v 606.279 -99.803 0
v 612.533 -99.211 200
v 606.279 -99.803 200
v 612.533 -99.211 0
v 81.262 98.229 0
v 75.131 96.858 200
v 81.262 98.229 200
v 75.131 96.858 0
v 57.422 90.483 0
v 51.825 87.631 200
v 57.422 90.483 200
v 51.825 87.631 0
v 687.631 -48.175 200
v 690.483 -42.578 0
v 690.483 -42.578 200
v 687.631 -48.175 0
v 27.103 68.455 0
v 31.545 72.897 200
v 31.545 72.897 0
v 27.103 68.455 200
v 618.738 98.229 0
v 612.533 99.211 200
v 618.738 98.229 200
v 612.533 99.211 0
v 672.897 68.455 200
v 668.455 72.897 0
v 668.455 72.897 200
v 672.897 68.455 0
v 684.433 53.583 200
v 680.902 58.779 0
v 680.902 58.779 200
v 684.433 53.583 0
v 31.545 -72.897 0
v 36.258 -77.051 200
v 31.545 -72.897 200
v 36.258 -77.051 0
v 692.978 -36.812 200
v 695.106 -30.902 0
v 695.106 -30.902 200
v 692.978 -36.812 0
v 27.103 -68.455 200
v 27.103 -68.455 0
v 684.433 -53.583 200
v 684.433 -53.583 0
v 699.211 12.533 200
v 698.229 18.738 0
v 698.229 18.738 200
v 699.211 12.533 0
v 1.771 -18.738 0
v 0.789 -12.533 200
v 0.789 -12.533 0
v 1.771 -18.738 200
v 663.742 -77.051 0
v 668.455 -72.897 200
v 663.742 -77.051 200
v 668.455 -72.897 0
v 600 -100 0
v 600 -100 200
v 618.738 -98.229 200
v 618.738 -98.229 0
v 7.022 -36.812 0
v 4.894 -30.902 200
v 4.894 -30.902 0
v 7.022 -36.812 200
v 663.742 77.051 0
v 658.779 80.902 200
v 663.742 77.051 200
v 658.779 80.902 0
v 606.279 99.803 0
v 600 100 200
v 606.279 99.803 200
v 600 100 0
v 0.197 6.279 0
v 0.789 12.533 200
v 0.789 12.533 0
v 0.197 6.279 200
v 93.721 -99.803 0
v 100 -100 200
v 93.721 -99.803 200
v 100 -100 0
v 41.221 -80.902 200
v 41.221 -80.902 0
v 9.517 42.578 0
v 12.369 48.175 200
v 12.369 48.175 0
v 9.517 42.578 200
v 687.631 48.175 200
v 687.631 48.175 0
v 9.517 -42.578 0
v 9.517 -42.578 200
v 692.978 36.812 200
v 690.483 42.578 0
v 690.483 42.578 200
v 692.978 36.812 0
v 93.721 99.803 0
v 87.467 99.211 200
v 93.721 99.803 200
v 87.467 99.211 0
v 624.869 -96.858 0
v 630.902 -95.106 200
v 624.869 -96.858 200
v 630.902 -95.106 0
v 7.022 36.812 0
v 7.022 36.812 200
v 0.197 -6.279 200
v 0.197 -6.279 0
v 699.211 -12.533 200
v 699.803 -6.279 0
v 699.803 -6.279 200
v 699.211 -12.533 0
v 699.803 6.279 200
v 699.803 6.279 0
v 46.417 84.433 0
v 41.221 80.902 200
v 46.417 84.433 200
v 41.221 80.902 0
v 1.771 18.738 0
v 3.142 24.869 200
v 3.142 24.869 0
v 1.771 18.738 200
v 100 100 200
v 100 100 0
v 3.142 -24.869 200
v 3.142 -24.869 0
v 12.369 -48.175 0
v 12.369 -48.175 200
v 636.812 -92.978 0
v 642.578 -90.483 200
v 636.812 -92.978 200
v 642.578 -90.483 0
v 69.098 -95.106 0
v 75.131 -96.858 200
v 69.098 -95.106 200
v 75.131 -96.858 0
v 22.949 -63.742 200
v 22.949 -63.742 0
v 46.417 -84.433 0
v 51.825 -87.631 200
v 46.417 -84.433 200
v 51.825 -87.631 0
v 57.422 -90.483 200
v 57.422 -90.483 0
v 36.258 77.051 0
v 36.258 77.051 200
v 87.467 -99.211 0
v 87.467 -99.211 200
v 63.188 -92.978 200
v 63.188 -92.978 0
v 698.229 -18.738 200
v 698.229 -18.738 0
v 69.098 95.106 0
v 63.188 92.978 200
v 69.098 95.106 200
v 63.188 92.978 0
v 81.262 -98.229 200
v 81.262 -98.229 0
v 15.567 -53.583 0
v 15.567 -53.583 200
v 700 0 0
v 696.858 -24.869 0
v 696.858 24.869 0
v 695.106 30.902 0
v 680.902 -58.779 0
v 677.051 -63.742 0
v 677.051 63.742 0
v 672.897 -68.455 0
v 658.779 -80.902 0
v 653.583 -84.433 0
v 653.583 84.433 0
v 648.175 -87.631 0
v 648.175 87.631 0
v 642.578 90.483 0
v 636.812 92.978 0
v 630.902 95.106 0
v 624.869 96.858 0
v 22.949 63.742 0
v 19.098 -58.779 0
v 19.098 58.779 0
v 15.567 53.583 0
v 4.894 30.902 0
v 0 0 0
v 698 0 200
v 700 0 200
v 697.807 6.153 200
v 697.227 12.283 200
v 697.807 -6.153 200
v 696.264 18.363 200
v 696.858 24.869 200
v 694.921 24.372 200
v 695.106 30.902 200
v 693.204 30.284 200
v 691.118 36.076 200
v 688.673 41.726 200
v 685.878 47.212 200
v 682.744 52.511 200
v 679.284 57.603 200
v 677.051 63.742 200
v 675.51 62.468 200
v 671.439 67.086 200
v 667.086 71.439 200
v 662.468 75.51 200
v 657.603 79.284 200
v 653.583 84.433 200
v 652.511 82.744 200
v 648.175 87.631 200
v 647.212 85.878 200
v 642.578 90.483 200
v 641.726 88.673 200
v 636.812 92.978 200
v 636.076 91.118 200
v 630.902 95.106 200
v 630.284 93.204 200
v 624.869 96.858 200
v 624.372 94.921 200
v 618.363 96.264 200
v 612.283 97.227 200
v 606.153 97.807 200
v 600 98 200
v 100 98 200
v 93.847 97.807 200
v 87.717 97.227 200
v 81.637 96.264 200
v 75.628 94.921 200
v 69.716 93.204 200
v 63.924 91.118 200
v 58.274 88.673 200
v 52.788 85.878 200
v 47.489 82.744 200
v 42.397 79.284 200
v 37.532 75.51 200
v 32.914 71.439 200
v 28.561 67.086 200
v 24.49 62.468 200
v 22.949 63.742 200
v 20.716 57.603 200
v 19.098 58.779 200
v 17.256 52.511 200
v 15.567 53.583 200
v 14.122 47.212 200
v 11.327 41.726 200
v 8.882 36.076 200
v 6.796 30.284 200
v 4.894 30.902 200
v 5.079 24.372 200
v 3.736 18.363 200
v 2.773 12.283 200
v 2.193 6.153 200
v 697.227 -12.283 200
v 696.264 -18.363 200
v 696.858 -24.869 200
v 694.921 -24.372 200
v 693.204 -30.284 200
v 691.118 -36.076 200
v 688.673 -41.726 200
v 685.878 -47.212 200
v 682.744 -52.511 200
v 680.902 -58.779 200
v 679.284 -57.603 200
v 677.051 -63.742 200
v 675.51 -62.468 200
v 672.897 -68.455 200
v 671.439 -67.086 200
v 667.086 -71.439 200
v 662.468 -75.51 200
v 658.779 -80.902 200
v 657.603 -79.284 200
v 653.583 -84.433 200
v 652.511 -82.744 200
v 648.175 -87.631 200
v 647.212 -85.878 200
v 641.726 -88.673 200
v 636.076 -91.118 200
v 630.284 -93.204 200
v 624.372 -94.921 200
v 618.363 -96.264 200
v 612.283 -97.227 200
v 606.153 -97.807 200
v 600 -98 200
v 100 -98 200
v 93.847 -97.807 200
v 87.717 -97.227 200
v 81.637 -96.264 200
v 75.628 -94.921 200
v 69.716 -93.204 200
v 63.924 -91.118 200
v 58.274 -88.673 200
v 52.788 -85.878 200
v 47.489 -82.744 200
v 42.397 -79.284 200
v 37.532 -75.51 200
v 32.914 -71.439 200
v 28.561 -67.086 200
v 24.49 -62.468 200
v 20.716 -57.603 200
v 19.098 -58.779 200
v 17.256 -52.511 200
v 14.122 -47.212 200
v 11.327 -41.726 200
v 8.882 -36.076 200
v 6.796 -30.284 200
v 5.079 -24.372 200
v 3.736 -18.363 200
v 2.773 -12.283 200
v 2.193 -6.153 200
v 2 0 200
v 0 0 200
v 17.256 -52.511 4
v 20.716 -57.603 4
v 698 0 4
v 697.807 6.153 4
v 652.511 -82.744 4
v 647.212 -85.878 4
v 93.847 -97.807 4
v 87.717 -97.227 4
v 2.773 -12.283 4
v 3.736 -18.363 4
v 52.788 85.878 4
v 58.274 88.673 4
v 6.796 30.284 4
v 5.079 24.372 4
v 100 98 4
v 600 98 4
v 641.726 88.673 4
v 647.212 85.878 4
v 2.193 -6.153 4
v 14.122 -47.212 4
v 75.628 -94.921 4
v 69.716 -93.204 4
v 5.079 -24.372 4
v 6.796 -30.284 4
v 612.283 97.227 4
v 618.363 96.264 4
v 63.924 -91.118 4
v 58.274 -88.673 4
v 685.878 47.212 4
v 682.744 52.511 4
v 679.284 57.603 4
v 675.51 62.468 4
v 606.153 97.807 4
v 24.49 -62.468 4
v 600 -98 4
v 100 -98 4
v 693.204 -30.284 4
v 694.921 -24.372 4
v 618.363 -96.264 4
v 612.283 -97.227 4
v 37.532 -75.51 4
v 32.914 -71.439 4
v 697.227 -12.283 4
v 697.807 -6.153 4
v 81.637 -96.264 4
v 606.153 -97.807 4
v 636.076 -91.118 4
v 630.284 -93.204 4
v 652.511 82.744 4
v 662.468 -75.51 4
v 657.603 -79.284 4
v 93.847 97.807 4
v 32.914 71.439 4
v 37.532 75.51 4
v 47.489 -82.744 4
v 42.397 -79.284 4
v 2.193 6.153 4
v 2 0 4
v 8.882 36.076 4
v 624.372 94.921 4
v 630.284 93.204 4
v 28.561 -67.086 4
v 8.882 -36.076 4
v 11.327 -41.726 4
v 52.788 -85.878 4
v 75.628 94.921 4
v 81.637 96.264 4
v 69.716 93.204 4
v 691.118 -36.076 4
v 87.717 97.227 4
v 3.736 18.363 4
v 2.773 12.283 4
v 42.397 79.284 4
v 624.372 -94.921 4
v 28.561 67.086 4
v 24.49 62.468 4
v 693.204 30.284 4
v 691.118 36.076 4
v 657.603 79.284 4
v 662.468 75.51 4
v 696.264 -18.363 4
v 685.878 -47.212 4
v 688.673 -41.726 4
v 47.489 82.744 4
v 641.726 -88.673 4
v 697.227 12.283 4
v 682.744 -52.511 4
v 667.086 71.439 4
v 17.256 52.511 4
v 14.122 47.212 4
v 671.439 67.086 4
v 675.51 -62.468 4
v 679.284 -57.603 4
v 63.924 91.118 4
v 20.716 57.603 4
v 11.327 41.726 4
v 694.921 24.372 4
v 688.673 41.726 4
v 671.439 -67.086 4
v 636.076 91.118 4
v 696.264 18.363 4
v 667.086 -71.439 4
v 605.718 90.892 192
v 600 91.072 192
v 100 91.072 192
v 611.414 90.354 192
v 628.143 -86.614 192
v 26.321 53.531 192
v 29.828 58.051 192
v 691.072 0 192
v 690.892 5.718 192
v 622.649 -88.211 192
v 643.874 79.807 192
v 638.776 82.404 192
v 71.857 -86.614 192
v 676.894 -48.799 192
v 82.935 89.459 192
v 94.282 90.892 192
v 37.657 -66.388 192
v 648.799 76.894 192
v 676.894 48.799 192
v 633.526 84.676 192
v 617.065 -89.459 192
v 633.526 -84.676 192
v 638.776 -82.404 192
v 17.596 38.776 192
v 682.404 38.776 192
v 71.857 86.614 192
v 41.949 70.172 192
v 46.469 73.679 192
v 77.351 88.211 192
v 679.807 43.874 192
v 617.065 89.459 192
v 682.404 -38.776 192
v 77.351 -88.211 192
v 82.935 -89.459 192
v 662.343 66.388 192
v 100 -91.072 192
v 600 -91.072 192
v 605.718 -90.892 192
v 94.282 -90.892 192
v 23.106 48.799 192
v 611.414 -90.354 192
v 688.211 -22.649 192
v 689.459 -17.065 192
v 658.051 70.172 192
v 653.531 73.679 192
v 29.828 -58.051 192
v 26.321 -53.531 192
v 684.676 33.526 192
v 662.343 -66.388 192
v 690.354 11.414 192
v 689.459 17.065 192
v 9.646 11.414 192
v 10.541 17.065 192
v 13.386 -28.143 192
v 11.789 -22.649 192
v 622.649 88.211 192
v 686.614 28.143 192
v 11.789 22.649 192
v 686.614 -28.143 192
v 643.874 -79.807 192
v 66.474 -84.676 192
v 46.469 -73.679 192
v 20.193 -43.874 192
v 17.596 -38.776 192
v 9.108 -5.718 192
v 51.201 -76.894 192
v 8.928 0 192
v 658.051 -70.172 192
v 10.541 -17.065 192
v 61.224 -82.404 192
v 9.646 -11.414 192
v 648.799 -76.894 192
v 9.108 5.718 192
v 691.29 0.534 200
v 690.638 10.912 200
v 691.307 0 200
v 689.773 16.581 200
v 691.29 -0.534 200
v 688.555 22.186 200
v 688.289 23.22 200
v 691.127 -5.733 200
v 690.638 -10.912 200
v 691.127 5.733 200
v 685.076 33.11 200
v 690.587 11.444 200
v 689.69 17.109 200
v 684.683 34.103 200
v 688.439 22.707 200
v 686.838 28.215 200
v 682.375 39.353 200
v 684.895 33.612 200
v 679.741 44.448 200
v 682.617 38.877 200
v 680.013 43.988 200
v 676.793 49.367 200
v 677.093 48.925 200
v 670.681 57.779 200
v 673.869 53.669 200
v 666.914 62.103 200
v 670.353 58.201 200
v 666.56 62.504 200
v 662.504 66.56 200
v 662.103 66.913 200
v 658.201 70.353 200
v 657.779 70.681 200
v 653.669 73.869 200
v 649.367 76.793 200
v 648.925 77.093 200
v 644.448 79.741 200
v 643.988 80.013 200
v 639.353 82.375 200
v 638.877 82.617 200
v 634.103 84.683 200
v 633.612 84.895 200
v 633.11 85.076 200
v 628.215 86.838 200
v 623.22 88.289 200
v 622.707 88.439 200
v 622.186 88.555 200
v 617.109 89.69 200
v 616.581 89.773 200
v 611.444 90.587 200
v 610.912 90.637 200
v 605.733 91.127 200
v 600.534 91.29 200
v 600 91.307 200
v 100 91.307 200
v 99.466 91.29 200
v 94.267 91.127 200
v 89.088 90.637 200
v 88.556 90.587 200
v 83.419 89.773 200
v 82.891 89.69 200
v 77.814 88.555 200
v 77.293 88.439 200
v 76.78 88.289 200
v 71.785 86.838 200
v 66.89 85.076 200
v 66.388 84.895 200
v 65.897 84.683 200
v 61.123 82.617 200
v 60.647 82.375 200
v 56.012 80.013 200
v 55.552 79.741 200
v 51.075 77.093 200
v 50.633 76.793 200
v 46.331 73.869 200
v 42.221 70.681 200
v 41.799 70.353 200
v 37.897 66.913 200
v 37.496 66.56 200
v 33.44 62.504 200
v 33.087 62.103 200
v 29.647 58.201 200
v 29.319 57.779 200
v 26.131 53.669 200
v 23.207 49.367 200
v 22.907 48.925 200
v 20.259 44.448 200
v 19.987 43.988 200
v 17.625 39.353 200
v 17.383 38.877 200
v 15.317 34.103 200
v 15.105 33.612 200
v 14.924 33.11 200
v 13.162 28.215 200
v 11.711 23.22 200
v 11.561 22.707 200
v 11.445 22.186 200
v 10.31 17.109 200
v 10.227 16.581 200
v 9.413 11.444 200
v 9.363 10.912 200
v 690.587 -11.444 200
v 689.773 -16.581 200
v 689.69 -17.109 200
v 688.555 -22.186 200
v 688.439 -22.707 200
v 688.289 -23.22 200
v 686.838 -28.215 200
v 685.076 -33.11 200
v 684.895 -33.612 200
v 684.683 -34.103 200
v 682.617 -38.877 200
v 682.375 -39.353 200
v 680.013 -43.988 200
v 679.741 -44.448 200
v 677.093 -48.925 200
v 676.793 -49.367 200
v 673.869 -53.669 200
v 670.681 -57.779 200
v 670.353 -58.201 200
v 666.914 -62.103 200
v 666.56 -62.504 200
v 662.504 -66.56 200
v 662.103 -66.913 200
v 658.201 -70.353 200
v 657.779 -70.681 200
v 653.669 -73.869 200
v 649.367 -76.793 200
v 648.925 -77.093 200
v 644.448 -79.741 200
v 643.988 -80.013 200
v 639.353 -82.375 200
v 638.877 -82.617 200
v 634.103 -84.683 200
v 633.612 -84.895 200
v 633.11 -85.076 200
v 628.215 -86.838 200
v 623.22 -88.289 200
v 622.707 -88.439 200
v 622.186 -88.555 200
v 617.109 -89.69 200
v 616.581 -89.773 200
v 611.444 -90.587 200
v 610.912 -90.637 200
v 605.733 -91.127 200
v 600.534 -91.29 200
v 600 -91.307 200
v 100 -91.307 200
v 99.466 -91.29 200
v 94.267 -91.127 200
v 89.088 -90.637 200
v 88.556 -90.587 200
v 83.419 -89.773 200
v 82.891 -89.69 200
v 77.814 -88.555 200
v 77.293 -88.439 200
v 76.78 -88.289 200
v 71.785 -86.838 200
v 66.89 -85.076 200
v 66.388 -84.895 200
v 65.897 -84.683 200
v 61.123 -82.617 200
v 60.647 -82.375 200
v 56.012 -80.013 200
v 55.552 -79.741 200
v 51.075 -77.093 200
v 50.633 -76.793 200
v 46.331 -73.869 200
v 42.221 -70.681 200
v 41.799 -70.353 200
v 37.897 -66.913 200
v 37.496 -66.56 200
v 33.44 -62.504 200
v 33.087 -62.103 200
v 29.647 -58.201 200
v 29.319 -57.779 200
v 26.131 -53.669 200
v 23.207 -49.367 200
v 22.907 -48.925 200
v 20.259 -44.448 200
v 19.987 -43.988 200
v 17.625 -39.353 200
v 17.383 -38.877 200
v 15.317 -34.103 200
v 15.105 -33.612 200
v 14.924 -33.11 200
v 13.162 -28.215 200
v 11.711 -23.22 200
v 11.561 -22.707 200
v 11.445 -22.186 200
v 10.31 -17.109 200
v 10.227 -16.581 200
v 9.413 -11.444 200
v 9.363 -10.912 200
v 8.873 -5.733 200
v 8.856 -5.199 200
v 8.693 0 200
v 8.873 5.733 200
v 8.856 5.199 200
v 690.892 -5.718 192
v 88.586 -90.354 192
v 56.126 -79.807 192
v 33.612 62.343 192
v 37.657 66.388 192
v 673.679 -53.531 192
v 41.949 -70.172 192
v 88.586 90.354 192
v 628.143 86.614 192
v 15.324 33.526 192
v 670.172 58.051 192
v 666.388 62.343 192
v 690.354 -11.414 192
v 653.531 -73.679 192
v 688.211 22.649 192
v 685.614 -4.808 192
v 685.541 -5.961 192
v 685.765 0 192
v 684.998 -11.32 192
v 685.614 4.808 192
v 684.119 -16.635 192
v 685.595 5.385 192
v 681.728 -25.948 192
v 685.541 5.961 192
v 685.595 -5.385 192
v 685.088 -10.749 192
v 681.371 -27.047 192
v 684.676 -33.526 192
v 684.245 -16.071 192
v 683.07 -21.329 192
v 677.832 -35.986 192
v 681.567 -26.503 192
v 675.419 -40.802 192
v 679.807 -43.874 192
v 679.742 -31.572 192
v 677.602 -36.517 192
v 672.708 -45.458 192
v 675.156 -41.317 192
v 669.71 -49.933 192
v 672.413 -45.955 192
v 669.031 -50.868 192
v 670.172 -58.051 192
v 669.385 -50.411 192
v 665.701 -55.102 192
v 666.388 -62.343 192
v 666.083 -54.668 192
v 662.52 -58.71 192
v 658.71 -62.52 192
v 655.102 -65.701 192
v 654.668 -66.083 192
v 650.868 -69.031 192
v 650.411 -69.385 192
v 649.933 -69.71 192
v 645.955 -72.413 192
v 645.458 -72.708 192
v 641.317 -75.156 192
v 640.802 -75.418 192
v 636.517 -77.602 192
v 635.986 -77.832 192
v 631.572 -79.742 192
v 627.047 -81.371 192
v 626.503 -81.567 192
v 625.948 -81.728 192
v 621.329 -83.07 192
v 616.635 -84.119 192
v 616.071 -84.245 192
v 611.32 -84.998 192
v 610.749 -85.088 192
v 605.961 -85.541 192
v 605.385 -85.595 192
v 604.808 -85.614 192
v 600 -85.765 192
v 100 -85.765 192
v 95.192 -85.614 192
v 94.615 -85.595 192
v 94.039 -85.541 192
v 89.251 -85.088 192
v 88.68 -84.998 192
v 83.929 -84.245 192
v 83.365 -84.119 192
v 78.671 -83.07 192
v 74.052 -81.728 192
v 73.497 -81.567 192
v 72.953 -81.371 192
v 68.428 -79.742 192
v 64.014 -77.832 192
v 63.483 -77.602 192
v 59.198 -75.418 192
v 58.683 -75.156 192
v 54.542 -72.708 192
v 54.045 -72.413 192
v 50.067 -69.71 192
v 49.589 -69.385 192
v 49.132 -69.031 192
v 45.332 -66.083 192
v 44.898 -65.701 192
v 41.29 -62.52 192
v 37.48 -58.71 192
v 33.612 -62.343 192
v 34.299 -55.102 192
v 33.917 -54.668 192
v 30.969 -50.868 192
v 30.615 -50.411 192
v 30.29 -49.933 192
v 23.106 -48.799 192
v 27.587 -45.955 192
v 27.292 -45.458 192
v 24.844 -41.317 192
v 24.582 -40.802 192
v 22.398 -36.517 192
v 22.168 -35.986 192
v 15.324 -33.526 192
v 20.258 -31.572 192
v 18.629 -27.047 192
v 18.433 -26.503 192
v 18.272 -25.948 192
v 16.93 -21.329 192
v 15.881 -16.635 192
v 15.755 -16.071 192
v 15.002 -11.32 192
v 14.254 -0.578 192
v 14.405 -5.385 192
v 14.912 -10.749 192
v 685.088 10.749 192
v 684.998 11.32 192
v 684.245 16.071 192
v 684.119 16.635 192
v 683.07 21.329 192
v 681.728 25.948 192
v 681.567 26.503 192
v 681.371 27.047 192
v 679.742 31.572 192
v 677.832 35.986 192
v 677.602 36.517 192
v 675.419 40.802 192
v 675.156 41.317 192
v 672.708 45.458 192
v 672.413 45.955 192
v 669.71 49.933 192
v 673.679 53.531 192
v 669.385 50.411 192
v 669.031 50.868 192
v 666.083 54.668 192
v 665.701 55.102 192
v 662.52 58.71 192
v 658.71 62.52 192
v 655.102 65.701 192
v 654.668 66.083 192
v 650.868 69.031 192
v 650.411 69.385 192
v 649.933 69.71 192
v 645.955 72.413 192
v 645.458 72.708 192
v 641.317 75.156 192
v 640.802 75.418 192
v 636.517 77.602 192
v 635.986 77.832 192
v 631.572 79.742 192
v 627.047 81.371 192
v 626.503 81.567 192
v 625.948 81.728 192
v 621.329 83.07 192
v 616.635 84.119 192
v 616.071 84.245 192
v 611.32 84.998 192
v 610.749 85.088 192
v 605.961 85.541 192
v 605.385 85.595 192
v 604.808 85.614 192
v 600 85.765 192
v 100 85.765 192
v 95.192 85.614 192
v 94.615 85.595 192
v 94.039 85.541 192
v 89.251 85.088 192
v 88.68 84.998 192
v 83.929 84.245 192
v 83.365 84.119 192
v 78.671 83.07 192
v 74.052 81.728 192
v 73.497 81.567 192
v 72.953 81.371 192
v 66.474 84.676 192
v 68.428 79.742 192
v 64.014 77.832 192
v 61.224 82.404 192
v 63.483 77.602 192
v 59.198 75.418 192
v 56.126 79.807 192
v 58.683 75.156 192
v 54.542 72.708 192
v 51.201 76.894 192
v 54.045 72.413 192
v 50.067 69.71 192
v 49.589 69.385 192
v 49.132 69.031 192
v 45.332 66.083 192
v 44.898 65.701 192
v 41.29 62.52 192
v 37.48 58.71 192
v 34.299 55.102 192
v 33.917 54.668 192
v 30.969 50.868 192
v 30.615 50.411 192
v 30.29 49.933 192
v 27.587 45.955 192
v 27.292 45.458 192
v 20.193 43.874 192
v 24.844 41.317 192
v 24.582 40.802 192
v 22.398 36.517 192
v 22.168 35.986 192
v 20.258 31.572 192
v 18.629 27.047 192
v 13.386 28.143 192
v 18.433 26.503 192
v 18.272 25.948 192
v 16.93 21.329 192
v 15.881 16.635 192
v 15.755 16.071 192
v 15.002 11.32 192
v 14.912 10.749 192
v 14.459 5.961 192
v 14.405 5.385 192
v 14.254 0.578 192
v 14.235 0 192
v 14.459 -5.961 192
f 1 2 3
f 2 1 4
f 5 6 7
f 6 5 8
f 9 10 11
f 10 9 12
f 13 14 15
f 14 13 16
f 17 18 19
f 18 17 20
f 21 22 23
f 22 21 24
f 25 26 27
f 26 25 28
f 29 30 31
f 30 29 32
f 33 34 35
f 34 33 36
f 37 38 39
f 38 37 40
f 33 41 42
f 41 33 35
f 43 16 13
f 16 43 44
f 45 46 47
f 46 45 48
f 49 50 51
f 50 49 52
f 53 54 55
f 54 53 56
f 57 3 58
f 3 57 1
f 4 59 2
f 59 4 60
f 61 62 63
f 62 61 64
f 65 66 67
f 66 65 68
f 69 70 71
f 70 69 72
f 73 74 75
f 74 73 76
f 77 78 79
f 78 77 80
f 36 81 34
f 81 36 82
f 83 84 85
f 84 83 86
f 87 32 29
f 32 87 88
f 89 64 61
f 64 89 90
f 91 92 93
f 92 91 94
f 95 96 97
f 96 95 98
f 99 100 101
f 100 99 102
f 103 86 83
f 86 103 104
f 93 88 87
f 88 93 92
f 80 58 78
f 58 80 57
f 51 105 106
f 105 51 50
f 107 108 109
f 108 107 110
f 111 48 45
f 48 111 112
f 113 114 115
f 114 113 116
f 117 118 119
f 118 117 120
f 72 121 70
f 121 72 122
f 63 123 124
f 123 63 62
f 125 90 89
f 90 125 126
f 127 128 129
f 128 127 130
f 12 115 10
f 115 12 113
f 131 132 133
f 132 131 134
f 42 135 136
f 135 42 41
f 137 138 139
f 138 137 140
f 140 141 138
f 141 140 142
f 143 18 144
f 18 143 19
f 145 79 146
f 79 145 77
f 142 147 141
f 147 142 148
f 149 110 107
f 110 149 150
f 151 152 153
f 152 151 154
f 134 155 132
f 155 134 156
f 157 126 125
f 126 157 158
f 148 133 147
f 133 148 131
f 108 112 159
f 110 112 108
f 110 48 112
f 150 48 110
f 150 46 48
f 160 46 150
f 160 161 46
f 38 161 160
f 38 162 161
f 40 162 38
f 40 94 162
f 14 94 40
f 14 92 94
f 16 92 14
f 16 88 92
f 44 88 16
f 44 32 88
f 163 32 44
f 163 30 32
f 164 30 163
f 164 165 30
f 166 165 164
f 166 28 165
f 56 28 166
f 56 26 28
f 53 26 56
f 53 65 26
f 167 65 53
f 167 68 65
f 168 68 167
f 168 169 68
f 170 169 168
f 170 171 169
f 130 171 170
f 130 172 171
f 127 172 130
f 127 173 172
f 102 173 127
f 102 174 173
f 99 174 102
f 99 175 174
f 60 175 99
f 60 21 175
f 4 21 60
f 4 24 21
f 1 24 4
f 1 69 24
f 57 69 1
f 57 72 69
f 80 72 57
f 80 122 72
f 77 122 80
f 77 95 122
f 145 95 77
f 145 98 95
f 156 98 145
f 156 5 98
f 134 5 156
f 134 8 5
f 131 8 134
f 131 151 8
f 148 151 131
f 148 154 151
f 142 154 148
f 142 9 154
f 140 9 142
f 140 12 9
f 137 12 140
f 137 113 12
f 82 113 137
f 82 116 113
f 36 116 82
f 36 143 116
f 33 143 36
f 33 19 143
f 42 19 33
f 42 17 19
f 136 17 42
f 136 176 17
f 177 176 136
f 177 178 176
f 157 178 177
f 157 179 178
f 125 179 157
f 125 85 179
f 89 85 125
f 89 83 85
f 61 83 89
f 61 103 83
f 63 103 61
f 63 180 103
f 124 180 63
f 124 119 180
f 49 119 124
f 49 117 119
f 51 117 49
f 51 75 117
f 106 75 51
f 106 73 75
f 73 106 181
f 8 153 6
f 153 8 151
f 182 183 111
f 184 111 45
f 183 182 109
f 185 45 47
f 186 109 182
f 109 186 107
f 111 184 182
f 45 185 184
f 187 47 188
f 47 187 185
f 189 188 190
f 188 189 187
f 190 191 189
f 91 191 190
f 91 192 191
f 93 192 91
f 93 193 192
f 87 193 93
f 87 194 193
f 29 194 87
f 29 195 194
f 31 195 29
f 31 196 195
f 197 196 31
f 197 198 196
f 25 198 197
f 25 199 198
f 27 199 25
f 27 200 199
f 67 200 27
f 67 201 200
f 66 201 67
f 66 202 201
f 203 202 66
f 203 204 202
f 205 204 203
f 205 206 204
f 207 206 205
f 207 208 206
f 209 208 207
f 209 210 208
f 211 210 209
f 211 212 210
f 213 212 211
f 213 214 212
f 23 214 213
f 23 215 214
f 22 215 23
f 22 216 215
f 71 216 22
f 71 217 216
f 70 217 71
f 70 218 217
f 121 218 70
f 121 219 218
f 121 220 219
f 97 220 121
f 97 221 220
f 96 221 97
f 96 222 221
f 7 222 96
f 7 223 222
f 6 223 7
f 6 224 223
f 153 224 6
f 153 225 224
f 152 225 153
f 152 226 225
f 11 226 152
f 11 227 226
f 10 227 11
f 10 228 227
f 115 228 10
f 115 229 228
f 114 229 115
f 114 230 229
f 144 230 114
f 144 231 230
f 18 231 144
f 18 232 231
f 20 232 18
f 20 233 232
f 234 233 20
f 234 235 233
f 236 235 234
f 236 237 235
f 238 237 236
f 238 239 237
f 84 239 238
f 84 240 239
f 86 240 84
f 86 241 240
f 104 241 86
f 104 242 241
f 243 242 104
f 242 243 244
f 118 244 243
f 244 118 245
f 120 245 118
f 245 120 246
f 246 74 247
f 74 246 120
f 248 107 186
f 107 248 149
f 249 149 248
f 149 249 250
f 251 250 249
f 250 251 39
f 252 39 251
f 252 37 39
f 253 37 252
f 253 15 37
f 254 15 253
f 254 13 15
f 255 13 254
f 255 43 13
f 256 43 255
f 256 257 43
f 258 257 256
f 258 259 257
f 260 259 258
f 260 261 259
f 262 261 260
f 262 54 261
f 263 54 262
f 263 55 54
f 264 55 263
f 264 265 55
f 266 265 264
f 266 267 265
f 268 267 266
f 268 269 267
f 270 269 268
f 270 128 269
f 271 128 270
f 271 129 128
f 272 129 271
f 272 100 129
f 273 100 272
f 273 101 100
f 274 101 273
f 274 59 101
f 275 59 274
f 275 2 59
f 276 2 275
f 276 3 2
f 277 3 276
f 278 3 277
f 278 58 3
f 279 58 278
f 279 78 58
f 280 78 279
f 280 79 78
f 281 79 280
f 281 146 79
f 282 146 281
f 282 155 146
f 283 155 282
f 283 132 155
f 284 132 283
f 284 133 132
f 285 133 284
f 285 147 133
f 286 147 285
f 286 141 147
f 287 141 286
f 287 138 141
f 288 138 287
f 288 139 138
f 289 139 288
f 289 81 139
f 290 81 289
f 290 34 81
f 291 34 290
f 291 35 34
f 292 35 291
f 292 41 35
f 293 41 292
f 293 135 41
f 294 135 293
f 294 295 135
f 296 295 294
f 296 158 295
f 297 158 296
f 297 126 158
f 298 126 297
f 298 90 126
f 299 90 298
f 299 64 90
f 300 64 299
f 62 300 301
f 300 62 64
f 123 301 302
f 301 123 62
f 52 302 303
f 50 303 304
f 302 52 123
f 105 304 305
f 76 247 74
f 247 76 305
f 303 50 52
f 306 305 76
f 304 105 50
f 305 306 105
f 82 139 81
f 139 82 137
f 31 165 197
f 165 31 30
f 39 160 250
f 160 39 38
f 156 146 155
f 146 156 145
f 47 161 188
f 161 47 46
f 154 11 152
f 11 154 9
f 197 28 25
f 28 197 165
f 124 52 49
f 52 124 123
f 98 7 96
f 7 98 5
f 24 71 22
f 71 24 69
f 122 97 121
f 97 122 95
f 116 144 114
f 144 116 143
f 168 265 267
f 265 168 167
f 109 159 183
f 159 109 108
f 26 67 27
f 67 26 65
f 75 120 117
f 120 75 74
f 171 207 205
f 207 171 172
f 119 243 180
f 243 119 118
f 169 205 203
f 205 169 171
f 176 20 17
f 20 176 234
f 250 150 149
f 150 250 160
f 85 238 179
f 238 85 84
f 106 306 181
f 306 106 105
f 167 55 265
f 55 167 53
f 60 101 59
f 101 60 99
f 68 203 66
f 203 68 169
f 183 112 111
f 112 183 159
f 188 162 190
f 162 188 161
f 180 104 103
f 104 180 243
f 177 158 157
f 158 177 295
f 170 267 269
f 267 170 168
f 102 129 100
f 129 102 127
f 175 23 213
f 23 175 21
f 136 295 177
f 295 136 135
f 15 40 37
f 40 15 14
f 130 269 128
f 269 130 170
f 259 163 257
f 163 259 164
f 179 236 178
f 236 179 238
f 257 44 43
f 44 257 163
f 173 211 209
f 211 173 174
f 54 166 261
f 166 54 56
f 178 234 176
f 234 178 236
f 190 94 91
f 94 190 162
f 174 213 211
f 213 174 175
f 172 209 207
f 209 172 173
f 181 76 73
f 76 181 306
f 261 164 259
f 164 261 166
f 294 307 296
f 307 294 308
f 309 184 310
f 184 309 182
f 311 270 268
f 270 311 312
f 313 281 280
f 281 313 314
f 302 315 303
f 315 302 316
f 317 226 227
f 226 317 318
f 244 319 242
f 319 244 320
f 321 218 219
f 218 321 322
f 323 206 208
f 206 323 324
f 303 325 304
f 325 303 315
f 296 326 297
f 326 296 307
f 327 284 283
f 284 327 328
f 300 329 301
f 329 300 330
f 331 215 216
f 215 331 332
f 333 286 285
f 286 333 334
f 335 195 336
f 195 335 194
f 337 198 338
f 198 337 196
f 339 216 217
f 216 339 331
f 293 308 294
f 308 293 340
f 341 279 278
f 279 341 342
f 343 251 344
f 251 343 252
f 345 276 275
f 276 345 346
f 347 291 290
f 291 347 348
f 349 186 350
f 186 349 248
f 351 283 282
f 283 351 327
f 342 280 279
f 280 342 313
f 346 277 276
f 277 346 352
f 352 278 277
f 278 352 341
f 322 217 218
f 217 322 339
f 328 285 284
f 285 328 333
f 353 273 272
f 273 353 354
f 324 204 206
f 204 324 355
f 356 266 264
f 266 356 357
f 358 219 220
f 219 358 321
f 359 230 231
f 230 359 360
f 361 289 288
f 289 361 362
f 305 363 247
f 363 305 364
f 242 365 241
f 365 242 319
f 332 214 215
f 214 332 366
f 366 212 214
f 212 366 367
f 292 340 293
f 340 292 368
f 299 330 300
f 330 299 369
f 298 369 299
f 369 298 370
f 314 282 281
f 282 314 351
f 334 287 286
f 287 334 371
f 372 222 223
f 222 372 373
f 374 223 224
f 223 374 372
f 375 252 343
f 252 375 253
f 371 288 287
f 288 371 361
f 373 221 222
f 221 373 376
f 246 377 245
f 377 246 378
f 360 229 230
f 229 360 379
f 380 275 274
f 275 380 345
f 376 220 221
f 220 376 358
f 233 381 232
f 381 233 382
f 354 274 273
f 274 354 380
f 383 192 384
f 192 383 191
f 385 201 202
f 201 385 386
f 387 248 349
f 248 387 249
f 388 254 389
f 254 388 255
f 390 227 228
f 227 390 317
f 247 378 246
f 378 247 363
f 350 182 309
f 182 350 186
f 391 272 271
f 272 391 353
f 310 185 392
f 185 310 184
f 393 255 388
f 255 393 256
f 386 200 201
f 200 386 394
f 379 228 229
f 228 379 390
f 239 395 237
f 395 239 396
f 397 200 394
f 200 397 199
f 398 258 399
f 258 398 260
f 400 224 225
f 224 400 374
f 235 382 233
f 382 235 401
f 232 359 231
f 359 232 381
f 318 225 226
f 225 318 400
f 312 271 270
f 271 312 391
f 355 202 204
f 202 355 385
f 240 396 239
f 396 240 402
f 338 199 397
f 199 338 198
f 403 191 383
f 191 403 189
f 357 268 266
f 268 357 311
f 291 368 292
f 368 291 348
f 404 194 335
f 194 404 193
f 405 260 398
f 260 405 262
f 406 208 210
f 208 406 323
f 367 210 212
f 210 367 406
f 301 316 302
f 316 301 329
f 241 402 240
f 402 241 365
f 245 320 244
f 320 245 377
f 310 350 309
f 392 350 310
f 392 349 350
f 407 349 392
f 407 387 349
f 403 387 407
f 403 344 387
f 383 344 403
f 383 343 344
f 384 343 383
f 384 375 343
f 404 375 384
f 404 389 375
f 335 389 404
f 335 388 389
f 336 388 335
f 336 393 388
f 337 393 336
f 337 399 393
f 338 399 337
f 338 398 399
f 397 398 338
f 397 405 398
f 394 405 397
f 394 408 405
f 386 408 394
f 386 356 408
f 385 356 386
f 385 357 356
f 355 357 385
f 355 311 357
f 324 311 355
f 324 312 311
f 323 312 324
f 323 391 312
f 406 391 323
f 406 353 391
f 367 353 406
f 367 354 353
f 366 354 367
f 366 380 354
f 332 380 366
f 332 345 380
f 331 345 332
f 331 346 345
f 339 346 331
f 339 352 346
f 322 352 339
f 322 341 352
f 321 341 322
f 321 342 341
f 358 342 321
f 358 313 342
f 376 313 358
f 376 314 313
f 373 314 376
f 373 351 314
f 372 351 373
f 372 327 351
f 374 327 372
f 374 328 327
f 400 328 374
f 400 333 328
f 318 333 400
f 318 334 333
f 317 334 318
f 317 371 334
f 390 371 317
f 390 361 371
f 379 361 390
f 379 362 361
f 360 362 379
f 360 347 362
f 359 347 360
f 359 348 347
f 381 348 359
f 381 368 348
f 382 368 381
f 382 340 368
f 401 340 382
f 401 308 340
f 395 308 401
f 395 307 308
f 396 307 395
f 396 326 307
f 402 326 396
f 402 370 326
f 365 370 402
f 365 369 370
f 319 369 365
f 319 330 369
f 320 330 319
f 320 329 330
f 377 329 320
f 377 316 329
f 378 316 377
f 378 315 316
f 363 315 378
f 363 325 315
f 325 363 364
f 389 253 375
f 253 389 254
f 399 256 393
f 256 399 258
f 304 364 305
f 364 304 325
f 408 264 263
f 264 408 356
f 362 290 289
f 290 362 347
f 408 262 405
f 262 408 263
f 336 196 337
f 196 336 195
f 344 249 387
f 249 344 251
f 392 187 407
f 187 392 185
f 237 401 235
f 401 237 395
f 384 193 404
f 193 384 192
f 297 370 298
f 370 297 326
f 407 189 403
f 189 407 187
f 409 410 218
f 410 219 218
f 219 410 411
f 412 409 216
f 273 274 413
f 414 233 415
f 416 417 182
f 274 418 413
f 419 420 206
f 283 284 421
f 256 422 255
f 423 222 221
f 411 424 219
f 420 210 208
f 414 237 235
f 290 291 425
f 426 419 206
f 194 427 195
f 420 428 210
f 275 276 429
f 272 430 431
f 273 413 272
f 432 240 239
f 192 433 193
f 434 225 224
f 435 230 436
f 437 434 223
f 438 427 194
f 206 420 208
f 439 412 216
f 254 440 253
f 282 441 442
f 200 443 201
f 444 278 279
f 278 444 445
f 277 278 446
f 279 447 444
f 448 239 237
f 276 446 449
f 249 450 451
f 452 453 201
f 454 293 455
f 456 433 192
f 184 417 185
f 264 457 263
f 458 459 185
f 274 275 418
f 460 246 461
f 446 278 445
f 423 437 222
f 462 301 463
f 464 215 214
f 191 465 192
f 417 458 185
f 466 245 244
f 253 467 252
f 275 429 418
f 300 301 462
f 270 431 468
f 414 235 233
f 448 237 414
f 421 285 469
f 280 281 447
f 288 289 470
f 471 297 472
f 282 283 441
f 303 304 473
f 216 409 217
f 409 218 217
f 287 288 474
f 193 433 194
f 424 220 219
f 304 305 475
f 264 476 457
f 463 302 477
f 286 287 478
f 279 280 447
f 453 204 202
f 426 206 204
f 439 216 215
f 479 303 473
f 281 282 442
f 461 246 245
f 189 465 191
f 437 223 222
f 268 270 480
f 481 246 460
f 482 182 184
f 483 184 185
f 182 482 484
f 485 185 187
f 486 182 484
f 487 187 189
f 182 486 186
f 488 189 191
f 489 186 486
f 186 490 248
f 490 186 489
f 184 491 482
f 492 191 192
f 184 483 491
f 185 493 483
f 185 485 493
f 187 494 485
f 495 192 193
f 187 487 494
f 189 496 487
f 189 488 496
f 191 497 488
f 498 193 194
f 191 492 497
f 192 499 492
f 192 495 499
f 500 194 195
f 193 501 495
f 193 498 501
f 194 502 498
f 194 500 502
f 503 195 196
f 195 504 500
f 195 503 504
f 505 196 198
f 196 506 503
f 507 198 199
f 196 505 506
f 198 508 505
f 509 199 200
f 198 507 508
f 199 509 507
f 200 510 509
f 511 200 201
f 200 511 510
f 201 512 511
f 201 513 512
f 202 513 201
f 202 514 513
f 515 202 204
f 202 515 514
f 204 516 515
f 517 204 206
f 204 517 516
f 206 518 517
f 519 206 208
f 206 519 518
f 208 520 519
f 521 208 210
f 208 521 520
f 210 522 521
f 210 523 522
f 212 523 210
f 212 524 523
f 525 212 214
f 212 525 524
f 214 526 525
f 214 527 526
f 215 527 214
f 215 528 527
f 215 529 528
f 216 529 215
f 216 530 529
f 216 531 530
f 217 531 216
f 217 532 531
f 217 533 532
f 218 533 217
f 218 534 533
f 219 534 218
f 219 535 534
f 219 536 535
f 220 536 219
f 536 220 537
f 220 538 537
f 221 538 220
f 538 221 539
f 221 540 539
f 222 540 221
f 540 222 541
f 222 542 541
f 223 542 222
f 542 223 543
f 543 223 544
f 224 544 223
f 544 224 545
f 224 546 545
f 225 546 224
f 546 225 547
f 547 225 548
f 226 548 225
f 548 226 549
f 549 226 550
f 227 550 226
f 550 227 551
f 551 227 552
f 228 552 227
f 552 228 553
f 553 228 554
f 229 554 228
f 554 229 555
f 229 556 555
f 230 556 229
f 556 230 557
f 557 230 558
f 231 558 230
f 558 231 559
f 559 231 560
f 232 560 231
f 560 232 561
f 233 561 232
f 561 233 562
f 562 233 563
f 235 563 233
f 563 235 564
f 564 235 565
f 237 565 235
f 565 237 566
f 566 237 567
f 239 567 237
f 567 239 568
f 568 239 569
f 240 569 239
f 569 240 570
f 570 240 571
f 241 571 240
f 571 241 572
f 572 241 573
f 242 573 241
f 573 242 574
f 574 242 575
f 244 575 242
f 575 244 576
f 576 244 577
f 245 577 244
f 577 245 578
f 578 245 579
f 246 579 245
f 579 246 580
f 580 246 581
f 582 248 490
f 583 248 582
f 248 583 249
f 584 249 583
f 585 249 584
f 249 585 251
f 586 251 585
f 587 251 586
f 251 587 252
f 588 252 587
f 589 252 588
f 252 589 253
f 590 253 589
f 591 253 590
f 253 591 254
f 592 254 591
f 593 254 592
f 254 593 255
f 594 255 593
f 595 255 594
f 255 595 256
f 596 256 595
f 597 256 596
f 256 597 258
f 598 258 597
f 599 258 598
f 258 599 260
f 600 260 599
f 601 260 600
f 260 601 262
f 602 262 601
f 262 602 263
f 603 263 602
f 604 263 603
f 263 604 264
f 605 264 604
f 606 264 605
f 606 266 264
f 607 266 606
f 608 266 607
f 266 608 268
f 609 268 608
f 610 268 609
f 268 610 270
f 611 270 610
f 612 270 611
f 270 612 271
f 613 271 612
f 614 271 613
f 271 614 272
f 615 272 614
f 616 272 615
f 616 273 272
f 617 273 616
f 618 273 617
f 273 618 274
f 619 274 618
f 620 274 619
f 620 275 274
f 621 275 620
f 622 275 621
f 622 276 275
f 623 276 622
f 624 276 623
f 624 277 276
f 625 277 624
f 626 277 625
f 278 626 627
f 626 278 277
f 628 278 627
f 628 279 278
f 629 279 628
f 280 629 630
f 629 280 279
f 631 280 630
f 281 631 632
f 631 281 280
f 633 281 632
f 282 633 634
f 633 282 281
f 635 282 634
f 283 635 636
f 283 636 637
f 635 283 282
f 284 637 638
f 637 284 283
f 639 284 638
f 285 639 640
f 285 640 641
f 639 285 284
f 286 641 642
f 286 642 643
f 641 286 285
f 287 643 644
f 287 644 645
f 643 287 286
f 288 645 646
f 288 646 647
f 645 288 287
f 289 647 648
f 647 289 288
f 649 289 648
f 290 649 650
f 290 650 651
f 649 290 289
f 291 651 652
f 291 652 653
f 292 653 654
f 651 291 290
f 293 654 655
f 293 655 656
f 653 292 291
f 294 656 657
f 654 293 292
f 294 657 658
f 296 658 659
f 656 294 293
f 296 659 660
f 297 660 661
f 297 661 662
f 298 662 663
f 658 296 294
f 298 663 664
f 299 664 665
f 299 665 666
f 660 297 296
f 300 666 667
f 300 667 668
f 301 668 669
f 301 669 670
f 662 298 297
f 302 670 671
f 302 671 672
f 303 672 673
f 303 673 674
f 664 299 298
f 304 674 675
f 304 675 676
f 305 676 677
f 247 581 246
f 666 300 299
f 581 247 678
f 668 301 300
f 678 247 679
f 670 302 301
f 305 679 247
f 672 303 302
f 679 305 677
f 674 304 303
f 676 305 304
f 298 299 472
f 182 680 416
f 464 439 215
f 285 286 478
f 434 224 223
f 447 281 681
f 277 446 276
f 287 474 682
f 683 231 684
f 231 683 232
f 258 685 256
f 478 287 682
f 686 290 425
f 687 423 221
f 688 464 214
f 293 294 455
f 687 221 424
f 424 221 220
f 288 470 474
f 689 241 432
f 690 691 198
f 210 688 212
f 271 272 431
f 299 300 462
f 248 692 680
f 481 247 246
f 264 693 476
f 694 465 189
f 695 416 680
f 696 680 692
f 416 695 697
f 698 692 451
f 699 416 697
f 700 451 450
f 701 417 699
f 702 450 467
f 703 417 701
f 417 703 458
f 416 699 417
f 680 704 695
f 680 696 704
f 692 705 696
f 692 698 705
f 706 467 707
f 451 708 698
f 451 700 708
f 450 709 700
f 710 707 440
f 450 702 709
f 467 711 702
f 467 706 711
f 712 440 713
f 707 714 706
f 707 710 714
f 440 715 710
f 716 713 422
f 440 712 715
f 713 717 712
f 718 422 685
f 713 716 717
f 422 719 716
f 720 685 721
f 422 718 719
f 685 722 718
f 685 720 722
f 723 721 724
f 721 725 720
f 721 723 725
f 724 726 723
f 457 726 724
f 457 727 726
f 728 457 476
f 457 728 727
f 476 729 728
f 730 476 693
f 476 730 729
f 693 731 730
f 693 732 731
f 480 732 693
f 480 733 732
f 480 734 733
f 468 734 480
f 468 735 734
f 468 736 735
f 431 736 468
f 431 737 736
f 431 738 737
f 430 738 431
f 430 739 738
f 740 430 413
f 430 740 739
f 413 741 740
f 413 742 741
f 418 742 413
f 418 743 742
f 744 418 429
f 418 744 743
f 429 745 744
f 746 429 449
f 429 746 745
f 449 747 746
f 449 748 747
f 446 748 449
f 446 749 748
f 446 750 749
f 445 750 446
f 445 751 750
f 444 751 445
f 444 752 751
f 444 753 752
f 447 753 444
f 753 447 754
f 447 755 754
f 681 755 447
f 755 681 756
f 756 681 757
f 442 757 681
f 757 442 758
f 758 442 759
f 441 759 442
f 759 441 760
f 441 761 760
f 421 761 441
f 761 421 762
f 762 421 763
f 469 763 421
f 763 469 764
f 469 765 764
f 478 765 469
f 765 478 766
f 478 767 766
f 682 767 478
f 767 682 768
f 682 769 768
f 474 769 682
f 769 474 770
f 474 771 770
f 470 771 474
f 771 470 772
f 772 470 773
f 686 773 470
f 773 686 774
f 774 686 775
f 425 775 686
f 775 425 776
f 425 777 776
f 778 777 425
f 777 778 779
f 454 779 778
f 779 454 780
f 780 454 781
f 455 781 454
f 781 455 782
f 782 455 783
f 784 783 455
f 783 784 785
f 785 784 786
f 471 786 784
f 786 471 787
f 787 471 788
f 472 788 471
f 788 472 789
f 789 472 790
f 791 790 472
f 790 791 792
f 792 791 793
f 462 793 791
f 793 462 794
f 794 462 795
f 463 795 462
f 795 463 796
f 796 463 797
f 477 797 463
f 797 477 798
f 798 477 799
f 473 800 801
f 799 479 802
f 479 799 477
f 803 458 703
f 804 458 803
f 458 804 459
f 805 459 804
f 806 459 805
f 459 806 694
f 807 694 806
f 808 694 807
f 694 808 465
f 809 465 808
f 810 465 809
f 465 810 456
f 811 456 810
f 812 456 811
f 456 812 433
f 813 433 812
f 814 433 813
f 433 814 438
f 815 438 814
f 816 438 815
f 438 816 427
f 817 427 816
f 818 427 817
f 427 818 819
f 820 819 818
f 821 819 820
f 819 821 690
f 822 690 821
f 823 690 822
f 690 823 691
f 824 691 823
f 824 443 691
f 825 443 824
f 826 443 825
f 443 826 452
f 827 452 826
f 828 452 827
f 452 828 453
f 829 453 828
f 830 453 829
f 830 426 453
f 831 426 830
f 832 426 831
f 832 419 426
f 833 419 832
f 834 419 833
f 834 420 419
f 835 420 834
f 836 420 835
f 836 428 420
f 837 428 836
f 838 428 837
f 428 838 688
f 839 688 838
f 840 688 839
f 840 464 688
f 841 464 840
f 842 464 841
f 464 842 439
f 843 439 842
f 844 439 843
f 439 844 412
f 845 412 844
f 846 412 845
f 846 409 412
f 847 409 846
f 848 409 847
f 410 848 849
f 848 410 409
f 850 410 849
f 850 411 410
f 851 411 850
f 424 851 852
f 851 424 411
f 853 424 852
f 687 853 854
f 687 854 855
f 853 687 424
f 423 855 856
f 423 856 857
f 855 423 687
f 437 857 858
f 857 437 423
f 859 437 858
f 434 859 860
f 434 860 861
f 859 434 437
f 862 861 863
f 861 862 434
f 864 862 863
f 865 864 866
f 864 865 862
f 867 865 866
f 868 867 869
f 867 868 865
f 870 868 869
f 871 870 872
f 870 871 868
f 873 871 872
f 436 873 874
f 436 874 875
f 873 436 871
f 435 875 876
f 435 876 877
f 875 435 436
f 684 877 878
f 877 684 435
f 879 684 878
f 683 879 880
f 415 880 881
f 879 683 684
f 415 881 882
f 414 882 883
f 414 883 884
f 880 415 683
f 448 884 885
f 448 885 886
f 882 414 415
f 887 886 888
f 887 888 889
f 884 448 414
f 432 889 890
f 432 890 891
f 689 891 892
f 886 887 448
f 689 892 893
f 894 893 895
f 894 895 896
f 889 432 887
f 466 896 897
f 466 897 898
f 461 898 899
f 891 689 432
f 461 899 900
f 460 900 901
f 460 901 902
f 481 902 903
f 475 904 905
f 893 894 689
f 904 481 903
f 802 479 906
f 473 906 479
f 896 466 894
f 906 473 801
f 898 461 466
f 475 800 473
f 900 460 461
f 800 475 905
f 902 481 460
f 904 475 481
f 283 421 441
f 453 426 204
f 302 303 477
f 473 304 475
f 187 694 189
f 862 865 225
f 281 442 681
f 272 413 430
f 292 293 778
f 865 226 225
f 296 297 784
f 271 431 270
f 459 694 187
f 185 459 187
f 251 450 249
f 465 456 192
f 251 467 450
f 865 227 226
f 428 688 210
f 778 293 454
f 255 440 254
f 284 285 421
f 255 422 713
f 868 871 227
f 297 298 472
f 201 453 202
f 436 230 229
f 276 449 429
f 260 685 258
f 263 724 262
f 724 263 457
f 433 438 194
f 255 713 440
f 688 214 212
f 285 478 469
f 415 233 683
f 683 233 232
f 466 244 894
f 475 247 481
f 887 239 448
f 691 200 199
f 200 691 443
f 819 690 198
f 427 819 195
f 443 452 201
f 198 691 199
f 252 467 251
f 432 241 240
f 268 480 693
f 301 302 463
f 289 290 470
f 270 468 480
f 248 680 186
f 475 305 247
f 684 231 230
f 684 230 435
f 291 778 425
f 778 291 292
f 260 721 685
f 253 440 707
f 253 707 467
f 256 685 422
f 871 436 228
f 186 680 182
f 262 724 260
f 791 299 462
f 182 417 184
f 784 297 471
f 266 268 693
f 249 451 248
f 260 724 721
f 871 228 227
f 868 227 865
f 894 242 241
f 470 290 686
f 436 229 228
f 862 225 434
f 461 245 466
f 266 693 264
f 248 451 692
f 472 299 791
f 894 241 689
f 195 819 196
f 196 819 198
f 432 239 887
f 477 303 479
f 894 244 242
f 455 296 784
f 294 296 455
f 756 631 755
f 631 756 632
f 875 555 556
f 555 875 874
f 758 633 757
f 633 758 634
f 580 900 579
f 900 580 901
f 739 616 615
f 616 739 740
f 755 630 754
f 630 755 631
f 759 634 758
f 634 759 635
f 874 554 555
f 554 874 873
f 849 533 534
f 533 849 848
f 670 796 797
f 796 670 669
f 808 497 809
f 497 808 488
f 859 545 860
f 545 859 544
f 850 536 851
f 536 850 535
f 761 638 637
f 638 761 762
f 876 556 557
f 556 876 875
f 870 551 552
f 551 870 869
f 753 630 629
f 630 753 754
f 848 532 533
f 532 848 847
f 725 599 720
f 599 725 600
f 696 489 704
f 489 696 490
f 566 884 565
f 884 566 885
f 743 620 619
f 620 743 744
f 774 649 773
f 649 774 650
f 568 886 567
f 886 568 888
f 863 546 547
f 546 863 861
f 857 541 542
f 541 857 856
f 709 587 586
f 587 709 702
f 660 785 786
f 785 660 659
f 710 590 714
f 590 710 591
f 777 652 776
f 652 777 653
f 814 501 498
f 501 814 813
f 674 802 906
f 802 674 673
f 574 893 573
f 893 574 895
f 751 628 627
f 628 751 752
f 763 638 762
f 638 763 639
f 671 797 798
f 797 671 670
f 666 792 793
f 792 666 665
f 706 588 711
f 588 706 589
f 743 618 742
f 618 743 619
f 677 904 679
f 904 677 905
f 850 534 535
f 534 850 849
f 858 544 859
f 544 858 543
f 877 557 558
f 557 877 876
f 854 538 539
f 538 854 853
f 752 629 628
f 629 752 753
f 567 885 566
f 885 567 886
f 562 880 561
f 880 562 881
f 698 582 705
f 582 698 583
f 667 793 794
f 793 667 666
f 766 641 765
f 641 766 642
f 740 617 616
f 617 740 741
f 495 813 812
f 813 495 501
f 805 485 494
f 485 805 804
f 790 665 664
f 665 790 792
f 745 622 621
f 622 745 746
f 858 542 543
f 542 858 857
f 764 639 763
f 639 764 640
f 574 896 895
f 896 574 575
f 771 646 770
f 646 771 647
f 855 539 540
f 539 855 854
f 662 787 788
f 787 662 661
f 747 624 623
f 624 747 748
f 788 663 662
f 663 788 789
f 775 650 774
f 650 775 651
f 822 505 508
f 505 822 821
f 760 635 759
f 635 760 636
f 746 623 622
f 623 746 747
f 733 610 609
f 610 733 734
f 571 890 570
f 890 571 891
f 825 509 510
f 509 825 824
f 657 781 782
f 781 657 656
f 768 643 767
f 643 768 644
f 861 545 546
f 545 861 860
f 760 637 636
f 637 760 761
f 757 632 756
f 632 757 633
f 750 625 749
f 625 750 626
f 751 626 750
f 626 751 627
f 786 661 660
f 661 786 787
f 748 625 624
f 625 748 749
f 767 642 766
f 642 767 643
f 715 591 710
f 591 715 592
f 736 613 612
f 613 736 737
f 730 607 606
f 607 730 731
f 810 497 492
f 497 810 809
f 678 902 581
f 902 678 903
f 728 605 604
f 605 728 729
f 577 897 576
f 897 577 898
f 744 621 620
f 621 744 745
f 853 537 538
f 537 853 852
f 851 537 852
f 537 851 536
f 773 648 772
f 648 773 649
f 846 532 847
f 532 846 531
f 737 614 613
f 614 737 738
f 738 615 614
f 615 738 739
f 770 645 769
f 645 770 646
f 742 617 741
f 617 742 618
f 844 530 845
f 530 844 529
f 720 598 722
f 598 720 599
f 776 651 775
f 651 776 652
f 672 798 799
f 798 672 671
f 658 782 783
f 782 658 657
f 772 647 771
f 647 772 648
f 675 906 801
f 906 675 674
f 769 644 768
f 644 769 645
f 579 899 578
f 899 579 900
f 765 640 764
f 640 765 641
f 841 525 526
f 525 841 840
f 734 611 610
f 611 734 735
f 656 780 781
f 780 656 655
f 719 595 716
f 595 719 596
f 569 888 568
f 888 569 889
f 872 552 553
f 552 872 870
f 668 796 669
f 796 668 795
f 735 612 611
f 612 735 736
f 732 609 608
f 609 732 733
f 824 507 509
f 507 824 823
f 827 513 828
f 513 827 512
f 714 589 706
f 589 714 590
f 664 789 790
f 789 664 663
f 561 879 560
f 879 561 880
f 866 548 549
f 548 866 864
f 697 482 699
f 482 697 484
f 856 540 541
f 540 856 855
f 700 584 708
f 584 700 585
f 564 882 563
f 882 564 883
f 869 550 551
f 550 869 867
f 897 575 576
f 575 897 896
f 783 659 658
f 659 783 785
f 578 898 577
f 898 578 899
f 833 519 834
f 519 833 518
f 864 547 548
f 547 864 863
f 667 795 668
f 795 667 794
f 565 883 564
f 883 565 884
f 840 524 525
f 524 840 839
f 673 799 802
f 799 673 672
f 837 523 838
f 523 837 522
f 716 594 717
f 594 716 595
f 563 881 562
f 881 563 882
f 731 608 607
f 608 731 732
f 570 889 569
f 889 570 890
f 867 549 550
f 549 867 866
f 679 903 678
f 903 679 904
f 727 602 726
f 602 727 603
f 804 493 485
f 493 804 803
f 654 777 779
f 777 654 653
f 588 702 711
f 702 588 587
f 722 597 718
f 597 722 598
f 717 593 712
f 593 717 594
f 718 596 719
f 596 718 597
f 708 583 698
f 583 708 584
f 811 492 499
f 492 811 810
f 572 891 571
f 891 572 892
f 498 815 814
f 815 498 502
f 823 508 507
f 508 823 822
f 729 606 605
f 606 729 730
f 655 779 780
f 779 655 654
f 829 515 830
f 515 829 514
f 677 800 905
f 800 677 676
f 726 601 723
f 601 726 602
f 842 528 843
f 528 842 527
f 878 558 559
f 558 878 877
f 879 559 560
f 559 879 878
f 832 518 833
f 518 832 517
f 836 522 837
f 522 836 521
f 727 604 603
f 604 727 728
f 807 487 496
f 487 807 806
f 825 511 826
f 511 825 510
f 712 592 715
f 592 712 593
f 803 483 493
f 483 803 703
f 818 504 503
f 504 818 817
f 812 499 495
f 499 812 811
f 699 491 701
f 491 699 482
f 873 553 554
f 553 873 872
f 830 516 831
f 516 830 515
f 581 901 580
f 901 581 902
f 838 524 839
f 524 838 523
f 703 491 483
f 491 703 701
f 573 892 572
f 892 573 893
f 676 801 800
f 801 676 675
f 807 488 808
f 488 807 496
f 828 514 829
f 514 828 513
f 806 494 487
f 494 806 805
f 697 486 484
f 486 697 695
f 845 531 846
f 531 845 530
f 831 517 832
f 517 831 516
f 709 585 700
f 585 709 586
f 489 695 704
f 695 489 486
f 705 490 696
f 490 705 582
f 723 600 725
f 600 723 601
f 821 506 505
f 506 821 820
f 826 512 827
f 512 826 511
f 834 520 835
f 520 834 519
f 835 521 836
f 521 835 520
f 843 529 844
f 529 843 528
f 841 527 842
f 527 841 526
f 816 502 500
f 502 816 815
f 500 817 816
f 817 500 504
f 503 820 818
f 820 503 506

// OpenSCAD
$fn = 100;

// ── Globale Parameter ────────────────────────────────────────
_height             = 200;
_width              = 700;
_depth              = 200;
_thickness          = 4;
_diffusor_thickness = 2;

// ── Kanten-Parameter ────────────────────────────────────────
_ledge_width  = 6;    // Auflagefläche (wie weit die Kante ins Innere ragt)
_ledge_height = 8;    // Höhe der Kante
_bevel_angle  = 60;   // Schrägungswinkel in Grad (nach innen-unten abfallend)


// ── Modul: Lightbox ─────────────────────────────────────────
module lightbox(_h, _w, _d, _t) {
    difference() {
        hull() {
            translate([_h / 2, 0, 0])
                cylinder(h = _d, d = _h);
            translate([_w - _h / 2, 0, 0])
                cylinder(h = _d, d = _h);
        }
        color("red")
        hull() {
            translate([_h / 2, 0, _t])
                cylinder(h = _d, d = _h - _t);
            translate([_w - _h / 2, 0, _t])
                cylinder(h = _d, d = _h - _t);
        }
    }
}


// ── Modul: Abgeschrägte Innenkante ──────────────────────────
// Positionierung erfolgt außen per translate()
// _h  : Höhe / Durchmesser der Lightbox
// _w  : Breite der Lightbox
// _t  : Wandstärke
// _lw : Breite der Kante (Auflagefläche)
// _lh : Höhe der Kante
// _ba : Schrägungswinkel in Grad
module inner_ledge(_h, _w, _t, _lw, _lh, _ba) {
    _boff = tan(_ba) * _lh;

    difference() {
        // Außenkontur: oben (d2) bündig mit Innenwand, unten (d1) um _boff zurückgesetzt
        hull() {
            translate([_h / 2, 0, 0])
                cylinder(h = _lh, d1 = _h - _t - _boff, d2 = _h - _t);
            translate([_w - _h / 2, 0, 0])
                cylinder(h = _lh, d1 = _h - _t - _boff, d2 = _h - _t);
        }
        // Innenaussparung: erzeugt die Ringbreite _lw
        hull() {
            translate([_h / 2, 0, -1])
                cylinder(h = _lh + 2, d1 = _h - _t - _lw * 2 - _boff, d2 = _h - _t - _lw * 2);
            translate([_w - _h / 2, 0, -1])
                cylinder(h = _lh + 2, d1 = _h - _t - _lw * 2 - _boff, d2 = _h - _t - _lw * 2);
        }
    }
}


// ── Ausgabe ──────────────────────────────────────────────────
lightbox(_height, _width, _depth, _thickness);

color("blue")
translate([0, 0, _depth - _ledge_height])
inner_ledge(
    _h  = _height,
    _w  = _width,
    _t  = _thickness,
    _lw = _ledge_width,
    _lh = _ledge_height,
    _ba = _bevel_angle
);
